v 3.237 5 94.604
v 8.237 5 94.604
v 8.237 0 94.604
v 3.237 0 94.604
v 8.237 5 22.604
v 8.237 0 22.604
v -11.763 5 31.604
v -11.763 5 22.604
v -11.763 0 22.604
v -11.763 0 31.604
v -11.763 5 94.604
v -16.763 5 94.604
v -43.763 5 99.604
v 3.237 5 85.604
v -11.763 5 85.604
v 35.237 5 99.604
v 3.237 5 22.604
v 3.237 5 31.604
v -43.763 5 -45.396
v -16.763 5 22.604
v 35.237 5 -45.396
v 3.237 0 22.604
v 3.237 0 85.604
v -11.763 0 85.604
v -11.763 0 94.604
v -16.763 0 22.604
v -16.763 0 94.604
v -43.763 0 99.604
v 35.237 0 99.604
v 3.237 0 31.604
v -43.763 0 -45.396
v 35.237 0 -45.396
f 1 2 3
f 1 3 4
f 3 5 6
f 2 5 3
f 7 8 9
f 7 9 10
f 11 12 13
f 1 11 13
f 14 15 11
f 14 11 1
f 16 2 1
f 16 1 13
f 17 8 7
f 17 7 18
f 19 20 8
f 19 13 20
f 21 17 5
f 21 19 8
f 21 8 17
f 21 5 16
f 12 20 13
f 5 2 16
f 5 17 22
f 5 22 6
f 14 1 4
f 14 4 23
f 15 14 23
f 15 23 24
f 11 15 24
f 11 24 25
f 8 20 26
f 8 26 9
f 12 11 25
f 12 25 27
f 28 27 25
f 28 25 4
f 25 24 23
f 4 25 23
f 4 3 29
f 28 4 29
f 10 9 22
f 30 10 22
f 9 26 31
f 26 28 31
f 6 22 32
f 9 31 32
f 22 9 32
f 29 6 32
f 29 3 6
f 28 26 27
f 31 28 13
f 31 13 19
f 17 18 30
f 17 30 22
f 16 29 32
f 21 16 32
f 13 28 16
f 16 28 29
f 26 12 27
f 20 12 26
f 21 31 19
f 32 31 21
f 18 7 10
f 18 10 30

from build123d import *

# Parameters (mm, degrees)
ESQUISSE1_W      = 79
ESQUISSE1_H      = 145
EXTRUSION1_DEPTH = 5
EXTRUSION2_REACH = 110.909


with BuildPart() as part:
    # Esquisse1 → Extrusion1 (new body)
    with BuildSketch(Plane(origin=(0, 0, 0), x_dir=(1, 0, 0), z_dir=(0, 1, 0))):
        with Locations((-4.262748952, -27.104127358)):
            Rectangle(ESQUISSE1_W, ESQUISSE1_H)
    extrude(amount=EXTRUSION1_DEPTH)

    # Esquisse2 → Extrusion2 (cut, up to next)
    with BuildSketch(Plane(origin=(0, 5, 0), x_dir=(1, 0, 0), z_dir=(0, 1, 0)), mode=Mode.PRIVATE) as extrusion2_sk1:
        Polygon((-16.762748952, -22.604127358), (-11.762748952, -22.604127358), (-11.762748952, -31.604127358), (3.237251048, -31.604127358), (3.237251048, -22.604127358), (8.237251048, -22.604127358), (8.237251048, -94.604127358), (3.237251048, -94.604127358), (3.237251048, -85.604127358), (-11.762748952, -85.604127358), (-11.762748952, -94.604127358), (-16.762748952, -94.604127358), align=None)
    extrusion2_tool1 = extrude(extrusion2_sk1.sketch, amount=-EXTRUSION2_REACH, mode=Mode.PRIVATE) & part.part
    add(extrusion2_tool1.solids().sort_by_distance((-4.262749, 5, 58.604127))[0], mode=Mode.SUBTRACT)


solid = part.part
